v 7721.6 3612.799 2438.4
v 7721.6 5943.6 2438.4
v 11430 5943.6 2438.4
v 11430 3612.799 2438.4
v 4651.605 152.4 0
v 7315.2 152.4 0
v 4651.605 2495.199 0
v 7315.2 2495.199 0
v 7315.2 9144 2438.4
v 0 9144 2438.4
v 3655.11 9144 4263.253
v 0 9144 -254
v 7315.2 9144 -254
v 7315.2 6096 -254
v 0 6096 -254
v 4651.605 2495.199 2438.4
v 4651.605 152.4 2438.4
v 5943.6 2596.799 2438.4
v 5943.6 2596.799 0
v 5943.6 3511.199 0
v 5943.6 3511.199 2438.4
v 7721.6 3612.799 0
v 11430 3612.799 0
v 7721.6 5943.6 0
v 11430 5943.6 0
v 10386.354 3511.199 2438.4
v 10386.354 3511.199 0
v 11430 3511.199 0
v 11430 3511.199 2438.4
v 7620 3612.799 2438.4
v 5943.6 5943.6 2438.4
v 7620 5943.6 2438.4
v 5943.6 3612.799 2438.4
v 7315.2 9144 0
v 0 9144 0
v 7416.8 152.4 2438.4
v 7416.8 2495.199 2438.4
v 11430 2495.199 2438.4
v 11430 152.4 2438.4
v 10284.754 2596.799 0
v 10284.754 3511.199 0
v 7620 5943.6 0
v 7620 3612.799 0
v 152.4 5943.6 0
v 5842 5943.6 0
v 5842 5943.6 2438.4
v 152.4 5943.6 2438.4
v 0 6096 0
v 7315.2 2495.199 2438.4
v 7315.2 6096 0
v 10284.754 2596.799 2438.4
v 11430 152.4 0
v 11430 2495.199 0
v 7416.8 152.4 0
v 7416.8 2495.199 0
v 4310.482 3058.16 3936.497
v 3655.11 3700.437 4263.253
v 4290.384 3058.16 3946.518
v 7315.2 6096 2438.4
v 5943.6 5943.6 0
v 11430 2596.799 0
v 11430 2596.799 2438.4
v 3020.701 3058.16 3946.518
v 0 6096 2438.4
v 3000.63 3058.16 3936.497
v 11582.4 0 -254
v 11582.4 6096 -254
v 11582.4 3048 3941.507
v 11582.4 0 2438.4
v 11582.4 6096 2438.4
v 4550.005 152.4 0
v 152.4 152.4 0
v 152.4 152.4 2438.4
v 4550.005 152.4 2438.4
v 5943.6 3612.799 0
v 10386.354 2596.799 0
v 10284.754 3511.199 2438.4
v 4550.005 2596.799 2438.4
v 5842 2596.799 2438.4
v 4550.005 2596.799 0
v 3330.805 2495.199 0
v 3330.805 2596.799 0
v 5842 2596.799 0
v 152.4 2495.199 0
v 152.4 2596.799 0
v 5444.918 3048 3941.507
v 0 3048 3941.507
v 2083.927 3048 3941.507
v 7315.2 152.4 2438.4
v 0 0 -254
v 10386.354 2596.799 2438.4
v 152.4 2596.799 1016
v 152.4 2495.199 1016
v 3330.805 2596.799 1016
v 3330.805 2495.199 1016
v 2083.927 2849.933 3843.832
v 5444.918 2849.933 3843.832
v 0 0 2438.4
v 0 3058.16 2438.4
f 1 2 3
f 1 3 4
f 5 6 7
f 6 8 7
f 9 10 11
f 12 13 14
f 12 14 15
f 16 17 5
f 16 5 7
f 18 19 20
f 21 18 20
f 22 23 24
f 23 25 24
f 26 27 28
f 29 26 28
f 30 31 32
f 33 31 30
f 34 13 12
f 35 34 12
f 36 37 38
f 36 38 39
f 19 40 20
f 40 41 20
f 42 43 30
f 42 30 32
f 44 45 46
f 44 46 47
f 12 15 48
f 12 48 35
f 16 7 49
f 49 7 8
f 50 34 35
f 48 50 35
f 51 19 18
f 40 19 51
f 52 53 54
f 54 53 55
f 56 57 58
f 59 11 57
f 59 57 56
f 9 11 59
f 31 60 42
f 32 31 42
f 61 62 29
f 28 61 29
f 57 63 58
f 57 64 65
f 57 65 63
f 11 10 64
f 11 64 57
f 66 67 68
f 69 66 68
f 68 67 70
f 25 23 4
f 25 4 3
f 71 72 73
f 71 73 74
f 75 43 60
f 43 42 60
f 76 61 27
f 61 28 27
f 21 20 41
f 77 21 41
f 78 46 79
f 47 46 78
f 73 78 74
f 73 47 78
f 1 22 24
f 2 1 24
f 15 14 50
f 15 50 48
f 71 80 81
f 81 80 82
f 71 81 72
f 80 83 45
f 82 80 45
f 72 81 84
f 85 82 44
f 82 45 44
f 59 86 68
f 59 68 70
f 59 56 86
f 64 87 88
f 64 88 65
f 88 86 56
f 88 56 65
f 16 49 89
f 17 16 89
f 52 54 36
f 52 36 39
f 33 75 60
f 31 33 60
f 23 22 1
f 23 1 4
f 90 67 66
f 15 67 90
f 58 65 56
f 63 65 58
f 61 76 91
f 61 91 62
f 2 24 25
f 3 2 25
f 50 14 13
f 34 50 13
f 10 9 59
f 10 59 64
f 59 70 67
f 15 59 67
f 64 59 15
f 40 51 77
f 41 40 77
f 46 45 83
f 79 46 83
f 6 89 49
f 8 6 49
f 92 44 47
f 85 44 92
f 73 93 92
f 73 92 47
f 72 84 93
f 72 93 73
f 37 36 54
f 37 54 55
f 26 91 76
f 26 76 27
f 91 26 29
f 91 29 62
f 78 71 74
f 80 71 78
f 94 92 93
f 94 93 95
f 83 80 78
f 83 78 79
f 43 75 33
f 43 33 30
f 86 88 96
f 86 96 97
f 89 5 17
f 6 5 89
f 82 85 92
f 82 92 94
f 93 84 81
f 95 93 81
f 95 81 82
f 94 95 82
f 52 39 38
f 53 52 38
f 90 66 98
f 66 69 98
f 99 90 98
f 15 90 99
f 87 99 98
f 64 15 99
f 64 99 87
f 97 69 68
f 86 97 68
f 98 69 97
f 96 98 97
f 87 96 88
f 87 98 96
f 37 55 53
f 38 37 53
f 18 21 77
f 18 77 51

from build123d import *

# Parameters (mm, degrees)
SKETCH3_W           = 11582.4
SKETCH3_H           = 6096
SKETCH3_W_2         = 4341.154286856
SKETCH3_H_2         = 914.4
SKETCH3_W_3         = 1676.4
SKETCH3_H_3         = 2330.801356814
SKETCH3_W_4         = 2663.595025017
SKETCH3_H_4         = 2342.798643186
SKETCH3_W_5         = 1043.645713144
SKETCH3_W_6         = 4013.2
SKETCH3_W_7         = 3708.4
BOSS_EXTRUDE1_DEPTH = 2438.4
SKETCH4_W           = 11582.4
SKETCH4_H           = 6096
BOSS_EXTRUDE2_DEPTH = 254
SKETCH5_W           = 3178.404974983
SKETCH5_H           = 101.6
BOSS_EXTRUDE3_DEPTH = 1016
BOSS_EXTRUDE4_DEPTH = 11582.4
SKETCH8_W           = 7315.2
SKETCH8_H           = 3048
BOSS_EXTRUDE6_DEPTH = 254
BOSS_EXTRUDE7_DEPTH = 6085.84
SKETCH11_W          = 3360.991367567
SKETCH11_H          = 1045.401535637
CUT_EXTRUDE1_DEPTH  = 6085.84


with BuildPart() as part:
    # Sketch3 → Boss-Extrude1 (new body)
    with BuildSketch(Plane.XY):
        with Locations((5791.2, 3048)):
            Rectangle(SKETCH3_W, SKETCH3_H)
        Polygon((152.4, 152.4), (4550.004974983, 152.4), (4550.004974983, 2596.798643186), (5842, 2596.798643186), (5842, 3511.198643186), (5842, 5943.6), (152.4, 5943.6), align=None, mode=Mode.SUBTRACT)
        with Locations((8114.177143428, 3053.998643186)):
            Rectangle(SKETCH3_W_2, SKETCH3_H_2, mode=Mode.SUBTRACT)
        with Locations((6781.8, 4778.199321593)):
            Rectangle(SKETCH3_W_3, SKETCH3_H_3, mode=Mode.SUBTRACT)
        with Locations((5983.402487492, 1323.799321593)):
            Rectangle(SKETCH3_W_4, SKETCH3_H_4, mode=Mode.SUBTRACT)
        with Locations((10908.177143428, 3053.998643186)):
            Rectangle(SKETCH3_W_5, SKETCH3_H_2, mode=Mode.SUBTRACT)
        with Locations((9423.4, 1323.799321593)):
            Rectangle(SKETCH3_W_6, SKETCH3_H_4, mode=Mode.SUBTRACT)
        with Locations((9575.8, 4778.199321593)):
            Rectangle(SKETCH3_W_7, SKETCH3_H_3, mode=Mode.SUBTRACT)
    extrude(amount=BOSS_EXTRUDE1_DEPTH)

    # Sketch4 → Boss-Extrude2 (add)
    with BuildSketch(Plane(origin=(0, 0, 0), x_dir=(-1, 0, 0), z_dir=(0, 0, -1))):
        with Locations((-5791.2, 3048)):
            Rectangle(SKETCH4_W, SKETCH4_H)
    extrude(amount=BOSS_EXTRUDE2_DEPTH)

    # Sketch5 → Boss-Extrude3 (add)
    with BuildSketch(Plane.XY):
        with Locations((1741.602487492, 2545.998643186)):
            Rectangle(SKETCH5_W, SKETCH5_H)
    extrude(amount=BOSS_EXTRUDE3_DEPTH)

    # Sketch6 → Boss-Extrude4 (add)
    with BuildSketch(Plane.ZY):
        Polygon((2438.4, 6096), (2438.4, 0), (3941.507258543, 3048), align=None)
    extrude(amount=-BOSS_EXTRUDE4_DEPTH)

    # Sketch10 → Boss-Extrude7 (add)
    with BuildSketch(Plane(origin=(0, 9144, 0), x_dir=(1, 0, 0), z_dir=(0, 1, 0))):
        Polygon((7315.2, -2438.4), (0, -2438.4), (3655.110432816, -4263.253342026), align=None)
    extrude(amount=-BOSS_EXTRUDE7_DEPTH)

    # Sketch11 → Cut-Extrude1 (cut)
    with BuildSketch(Plane(origin=(0, -967.256392483, 1961.401934247), x_dir=(1, 0, 0), z_dir=(0, -0.44228869, 0.896872742))):
        with Locations((3764.422731341, 4778.811583623)):
            Rectangle(SKETCH11_W, SKETCH11_H)
    extrude(amount=CUT_EXTRUDE1_DEPTH, mode=Mode.SUBTRACT)


with BuildPart() as body_2:
    # Sketch8 → Boss-Extrude6 (new body)
    with BuildSketch(Plane(origin=(0, 0, -254), x_dir=(-1, 0, 0), z_dir=(0, 0, -1))):
        with Locations((-3657.6, 7620)):
            Rectangle(SKETCH8_W, SKETCH8_H)
    extrude(amount=-BOSS_EXTRUDE6_DEPTH)


solid = Compound([part.part, body_2.part])
